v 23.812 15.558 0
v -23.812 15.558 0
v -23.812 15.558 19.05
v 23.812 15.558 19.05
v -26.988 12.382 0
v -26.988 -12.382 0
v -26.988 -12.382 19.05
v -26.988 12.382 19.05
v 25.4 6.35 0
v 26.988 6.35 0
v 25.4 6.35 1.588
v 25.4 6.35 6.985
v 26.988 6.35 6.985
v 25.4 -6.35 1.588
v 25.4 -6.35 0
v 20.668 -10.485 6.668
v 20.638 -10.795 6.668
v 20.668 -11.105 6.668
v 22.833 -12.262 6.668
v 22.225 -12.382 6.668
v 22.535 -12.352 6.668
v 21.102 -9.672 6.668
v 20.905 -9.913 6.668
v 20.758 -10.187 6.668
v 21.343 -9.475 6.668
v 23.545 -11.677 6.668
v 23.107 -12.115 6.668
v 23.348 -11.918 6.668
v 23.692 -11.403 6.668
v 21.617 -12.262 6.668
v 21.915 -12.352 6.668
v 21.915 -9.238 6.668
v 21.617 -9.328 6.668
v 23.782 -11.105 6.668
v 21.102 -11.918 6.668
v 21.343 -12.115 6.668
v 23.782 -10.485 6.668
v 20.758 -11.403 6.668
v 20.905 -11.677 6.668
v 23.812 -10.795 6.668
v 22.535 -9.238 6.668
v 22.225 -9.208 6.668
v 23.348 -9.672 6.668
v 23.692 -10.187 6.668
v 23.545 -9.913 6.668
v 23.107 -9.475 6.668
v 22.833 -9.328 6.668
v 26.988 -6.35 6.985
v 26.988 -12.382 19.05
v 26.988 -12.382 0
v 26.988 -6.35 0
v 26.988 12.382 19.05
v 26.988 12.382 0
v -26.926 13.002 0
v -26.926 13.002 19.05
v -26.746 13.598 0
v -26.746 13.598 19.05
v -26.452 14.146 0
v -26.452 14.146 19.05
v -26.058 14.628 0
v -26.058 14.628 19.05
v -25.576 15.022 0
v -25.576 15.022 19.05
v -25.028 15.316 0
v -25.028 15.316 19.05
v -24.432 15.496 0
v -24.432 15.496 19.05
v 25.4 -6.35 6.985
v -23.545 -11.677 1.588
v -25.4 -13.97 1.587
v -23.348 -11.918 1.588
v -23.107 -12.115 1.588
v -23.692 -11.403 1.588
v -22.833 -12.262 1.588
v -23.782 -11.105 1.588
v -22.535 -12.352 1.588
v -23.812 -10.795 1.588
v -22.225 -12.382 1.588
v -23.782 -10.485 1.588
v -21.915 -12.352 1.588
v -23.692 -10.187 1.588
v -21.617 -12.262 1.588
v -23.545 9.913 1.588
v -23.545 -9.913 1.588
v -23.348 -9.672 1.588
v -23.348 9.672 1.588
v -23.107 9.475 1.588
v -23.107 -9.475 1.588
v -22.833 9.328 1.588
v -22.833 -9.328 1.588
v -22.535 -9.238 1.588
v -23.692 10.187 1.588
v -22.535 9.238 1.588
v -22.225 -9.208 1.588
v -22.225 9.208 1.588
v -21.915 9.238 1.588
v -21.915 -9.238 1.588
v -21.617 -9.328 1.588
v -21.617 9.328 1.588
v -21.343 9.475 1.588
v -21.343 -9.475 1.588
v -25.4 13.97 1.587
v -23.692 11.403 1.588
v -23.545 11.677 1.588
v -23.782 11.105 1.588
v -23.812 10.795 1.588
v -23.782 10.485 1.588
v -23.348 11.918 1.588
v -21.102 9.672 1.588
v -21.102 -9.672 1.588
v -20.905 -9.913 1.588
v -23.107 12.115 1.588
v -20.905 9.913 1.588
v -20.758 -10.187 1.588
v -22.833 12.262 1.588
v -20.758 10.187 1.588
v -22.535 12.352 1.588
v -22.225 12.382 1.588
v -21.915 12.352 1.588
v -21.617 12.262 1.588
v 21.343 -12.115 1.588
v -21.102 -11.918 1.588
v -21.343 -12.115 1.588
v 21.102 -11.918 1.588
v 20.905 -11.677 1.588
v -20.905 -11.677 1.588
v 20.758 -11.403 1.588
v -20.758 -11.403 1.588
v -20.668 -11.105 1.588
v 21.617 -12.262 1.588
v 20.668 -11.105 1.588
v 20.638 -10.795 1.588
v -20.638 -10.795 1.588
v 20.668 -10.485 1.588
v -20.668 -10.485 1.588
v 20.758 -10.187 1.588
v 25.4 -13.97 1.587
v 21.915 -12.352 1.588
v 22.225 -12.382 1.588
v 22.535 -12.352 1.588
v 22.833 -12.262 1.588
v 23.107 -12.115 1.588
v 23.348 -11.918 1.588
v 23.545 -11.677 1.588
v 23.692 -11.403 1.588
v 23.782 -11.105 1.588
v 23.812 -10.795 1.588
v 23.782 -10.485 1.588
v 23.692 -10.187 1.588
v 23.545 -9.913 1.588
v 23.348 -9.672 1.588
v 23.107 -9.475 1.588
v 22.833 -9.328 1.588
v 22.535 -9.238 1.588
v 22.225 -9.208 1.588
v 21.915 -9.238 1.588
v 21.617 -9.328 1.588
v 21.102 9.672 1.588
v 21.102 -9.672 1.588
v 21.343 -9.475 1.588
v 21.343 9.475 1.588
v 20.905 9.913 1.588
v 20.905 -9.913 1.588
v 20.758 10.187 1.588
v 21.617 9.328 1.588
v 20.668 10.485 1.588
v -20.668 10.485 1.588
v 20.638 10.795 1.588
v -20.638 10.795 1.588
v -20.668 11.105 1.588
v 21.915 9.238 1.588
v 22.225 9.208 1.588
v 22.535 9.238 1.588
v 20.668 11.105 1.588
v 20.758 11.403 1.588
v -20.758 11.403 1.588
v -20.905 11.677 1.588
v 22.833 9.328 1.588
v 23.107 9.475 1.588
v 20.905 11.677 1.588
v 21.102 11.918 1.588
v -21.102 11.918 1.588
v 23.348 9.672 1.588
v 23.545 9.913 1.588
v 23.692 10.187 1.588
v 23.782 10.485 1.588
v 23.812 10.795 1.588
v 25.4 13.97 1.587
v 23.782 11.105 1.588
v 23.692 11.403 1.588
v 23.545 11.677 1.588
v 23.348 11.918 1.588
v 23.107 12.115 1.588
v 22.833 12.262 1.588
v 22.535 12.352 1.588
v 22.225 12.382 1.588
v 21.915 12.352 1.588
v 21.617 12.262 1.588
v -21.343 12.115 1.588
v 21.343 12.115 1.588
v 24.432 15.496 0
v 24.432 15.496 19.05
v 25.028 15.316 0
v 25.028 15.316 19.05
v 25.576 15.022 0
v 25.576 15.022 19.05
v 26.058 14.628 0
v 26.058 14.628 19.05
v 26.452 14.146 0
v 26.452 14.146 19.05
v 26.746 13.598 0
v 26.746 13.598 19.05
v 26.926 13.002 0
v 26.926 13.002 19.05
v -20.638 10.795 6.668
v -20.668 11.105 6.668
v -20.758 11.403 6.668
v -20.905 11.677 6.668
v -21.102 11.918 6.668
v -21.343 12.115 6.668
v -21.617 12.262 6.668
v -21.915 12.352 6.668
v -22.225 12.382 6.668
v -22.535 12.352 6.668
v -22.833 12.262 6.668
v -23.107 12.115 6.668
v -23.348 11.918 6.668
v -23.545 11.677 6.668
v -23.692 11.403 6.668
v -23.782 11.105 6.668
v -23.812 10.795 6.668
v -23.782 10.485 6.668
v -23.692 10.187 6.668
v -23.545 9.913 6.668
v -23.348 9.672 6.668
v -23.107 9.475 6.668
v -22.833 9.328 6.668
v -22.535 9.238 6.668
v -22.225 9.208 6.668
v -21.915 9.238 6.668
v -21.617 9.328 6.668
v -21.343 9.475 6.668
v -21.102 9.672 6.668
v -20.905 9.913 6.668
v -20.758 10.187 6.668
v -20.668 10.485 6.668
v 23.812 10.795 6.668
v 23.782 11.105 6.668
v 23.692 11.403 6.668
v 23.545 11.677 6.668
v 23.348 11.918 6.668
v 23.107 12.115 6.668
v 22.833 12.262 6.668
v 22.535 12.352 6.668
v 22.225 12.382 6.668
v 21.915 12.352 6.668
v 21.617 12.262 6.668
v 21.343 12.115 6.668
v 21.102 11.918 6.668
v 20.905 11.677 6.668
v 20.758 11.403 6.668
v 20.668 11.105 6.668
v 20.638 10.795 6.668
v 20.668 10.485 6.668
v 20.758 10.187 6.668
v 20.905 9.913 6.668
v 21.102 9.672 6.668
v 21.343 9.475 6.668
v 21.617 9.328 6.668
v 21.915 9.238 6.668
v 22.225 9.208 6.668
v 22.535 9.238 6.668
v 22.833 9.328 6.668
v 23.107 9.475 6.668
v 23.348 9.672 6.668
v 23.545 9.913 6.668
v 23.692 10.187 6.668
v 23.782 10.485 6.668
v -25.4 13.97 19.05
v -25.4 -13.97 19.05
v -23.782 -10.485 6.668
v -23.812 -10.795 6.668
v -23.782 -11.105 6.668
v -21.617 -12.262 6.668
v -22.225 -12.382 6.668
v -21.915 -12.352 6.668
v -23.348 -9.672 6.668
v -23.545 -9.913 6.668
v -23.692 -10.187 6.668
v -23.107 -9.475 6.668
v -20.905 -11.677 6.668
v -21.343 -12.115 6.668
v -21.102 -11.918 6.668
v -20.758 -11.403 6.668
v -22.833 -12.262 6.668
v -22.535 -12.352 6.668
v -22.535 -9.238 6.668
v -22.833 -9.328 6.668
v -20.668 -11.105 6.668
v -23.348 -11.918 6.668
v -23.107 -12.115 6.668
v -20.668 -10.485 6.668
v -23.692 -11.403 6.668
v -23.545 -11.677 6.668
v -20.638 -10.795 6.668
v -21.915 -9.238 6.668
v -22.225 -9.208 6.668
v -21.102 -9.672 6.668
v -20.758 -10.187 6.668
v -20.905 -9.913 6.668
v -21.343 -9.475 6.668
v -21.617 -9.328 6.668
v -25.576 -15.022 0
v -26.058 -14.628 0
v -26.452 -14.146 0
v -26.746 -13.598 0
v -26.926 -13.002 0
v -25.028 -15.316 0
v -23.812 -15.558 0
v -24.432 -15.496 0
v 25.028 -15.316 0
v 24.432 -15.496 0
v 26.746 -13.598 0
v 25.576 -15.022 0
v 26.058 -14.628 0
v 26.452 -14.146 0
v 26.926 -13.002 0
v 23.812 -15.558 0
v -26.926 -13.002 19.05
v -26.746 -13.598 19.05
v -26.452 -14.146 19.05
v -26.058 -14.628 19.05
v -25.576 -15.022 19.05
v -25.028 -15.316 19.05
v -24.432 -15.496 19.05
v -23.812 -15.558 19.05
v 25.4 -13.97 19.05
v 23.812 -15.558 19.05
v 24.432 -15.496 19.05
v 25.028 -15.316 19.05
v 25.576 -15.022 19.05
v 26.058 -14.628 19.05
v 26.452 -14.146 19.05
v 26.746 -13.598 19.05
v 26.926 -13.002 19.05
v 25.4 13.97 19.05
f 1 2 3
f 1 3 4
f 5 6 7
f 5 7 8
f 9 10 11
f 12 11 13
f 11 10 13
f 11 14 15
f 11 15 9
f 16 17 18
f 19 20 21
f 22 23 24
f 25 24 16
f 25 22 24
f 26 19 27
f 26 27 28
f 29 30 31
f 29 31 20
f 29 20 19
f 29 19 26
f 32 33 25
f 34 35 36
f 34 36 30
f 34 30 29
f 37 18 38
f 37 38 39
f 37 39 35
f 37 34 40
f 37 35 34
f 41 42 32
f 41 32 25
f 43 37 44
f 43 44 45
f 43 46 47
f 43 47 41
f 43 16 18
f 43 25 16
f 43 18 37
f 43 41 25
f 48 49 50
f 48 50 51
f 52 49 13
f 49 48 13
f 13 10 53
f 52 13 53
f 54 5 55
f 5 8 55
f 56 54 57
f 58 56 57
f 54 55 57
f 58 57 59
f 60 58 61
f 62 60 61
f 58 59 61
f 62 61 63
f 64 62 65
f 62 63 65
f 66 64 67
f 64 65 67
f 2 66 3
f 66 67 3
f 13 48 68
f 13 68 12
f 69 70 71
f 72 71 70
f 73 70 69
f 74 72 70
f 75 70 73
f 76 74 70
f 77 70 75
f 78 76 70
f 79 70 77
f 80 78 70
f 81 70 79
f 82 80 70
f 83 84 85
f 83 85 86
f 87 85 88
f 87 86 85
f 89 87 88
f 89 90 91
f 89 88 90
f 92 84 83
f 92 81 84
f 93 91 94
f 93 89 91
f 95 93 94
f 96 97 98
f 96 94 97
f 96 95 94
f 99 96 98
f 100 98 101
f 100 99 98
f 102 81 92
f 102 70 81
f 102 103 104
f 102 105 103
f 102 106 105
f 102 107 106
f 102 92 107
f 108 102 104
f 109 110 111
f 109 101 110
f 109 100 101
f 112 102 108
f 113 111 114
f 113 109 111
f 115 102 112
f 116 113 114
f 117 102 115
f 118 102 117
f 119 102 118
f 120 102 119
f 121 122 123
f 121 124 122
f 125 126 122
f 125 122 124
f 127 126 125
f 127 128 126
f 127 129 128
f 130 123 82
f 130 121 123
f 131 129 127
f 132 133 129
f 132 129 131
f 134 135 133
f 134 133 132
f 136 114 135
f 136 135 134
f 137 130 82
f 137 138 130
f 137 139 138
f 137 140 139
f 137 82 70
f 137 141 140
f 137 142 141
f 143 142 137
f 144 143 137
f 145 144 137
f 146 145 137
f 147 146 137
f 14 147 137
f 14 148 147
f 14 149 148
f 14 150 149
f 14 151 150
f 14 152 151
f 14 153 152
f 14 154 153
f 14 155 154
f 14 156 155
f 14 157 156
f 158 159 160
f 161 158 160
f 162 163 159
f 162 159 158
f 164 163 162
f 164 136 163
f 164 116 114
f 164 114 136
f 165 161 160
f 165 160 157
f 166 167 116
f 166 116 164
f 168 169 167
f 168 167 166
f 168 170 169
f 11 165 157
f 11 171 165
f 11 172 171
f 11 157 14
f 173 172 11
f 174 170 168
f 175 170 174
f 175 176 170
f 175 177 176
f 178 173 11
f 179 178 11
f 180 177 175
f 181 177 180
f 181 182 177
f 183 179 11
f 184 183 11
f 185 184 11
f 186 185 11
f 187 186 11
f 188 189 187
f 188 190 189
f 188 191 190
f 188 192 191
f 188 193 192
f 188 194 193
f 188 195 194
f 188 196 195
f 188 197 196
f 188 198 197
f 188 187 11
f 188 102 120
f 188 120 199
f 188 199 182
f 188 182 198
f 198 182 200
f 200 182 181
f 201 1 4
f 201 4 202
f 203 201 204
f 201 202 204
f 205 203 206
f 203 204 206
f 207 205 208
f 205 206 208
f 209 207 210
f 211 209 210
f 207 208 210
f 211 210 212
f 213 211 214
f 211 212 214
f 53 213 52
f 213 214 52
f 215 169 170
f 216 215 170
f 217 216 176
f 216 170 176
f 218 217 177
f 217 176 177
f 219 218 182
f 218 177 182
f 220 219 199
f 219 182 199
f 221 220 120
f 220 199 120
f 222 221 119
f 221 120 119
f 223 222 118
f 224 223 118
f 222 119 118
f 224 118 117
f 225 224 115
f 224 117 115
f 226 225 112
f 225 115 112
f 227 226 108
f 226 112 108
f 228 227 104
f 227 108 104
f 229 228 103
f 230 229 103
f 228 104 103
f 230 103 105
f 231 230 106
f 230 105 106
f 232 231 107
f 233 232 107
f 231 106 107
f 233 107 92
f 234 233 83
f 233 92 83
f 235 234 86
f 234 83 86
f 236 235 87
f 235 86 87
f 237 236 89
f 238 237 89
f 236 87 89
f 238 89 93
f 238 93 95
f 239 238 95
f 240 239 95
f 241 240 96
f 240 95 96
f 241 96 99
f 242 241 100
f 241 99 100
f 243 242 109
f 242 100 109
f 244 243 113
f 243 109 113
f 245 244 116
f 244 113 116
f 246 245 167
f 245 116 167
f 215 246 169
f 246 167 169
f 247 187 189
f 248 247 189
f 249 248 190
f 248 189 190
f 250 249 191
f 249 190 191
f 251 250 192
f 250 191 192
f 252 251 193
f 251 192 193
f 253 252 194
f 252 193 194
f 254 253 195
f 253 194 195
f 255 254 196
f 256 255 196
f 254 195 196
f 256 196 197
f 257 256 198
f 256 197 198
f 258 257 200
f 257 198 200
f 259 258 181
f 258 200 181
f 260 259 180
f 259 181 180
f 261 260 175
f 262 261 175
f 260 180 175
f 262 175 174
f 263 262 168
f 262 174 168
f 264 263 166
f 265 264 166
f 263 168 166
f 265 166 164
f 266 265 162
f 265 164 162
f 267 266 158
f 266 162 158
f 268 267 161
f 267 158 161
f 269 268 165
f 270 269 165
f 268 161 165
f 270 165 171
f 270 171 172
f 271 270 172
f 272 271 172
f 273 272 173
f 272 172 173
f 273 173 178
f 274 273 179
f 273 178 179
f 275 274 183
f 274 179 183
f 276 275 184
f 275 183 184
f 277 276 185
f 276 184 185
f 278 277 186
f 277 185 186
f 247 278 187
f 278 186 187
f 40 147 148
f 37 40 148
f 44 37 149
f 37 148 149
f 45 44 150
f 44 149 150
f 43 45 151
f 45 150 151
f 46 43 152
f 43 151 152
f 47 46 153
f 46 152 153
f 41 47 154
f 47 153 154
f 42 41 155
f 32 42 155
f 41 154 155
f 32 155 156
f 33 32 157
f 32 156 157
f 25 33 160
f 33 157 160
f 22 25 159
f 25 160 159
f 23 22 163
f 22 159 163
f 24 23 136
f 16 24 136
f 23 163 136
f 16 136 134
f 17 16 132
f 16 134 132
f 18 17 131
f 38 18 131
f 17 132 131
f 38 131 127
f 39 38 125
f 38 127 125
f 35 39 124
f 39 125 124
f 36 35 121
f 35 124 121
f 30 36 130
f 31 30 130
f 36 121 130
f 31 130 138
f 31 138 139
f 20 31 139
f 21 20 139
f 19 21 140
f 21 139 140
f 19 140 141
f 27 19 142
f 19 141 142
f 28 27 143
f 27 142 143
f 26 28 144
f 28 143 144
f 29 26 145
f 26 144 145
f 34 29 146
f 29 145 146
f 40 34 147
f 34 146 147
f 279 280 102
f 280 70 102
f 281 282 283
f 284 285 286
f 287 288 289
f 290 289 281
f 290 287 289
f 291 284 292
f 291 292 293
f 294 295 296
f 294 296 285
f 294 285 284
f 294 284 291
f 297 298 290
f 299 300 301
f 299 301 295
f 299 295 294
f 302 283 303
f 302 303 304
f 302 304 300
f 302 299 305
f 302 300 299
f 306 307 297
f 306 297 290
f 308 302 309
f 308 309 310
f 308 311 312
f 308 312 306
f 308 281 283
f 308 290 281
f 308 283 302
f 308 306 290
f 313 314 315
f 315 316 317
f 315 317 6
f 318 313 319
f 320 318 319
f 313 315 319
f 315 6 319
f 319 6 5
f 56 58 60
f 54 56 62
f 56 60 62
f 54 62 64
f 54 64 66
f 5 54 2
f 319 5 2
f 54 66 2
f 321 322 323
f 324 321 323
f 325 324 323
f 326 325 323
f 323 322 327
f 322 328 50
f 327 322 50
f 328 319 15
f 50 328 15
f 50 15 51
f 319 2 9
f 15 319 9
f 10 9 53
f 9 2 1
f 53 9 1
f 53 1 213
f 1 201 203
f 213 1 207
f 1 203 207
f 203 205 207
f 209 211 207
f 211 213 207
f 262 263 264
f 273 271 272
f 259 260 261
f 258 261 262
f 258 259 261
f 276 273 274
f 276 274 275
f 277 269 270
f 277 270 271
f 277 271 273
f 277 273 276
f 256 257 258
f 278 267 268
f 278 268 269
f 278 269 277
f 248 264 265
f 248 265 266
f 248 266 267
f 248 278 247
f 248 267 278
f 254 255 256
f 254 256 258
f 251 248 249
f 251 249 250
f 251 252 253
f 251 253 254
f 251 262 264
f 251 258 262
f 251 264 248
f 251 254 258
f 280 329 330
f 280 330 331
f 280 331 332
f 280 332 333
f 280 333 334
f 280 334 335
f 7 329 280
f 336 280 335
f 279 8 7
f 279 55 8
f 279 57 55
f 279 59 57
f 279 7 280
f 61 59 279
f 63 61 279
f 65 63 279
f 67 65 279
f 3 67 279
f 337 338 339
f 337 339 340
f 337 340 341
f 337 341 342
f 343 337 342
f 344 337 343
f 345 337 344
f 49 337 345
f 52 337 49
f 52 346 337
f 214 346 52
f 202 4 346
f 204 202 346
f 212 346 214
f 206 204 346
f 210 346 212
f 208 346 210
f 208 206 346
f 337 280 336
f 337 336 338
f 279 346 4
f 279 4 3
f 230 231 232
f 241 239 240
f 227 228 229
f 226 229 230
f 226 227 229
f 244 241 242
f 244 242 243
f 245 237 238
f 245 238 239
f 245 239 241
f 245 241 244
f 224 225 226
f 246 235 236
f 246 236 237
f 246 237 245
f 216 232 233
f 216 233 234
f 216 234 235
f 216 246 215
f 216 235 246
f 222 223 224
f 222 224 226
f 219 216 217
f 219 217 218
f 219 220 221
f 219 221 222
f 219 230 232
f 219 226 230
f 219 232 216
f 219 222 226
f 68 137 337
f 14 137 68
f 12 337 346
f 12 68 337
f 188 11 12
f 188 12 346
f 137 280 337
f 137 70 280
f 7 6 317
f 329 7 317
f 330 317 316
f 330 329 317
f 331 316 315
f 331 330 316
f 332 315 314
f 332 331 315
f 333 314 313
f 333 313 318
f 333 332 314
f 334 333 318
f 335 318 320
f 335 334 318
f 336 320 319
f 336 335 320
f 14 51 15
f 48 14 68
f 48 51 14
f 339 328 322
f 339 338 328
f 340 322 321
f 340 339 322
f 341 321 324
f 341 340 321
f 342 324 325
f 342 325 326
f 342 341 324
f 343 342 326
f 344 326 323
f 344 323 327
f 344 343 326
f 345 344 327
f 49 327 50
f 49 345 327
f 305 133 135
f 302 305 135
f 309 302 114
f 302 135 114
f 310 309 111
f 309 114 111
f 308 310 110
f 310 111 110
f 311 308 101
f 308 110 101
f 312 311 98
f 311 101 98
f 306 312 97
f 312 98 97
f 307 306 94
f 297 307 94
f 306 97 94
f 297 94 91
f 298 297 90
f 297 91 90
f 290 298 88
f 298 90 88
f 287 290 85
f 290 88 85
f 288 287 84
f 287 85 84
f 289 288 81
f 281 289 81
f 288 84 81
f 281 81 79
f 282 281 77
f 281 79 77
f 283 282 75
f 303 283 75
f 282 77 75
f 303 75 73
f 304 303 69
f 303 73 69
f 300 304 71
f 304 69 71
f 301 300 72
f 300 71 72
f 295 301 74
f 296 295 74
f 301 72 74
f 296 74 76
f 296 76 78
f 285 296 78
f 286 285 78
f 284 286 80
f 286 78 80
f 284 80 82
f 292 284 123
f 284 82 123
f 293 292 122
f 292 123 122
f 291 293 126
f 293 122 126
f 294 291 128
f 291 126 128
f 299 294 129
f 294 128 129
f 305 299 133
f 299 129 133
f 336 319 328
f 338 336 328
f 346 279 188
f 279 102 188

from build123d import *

# Parameters (mm, degrees)
F0_W     = 53.975
F0_H     = 31.115
F1_DEPTH = 19.05
F2_T     = -1.5875
F3_R     = 1.5875
F4_DEPTH = 5.08
F5_W     = 12.7
F5_H     = 7.62
F6_DEPTH = 1.5875
F7_R     = 3.175


with BuildPart() as f1:
    # F0 (on Top) → F1 (new body)
    with BuildSketch(Plane.XY):
        Rectangle(F0_W, F0_H)
    extrude(amount=F1_DEPTH)

    # F2
    f2_openings = [f1.faces().sort_by_distance(p)[0] for p in [
        (0, 0, 19.05),
    ]]
    offset(amount=F2_T, openings=f2_openings)

    # F3 (on face) → F4 (join)
    with BuildSketch(Plane.XY.offset(1.5875)):
        with Locations((22.225, 10.795)):
            Circle(F3_R)
        with Locations((22.225, -10.795)):
            Circle(F3_R)
        with Locations((-22.225, 10.795)):
            Circle(F3_R)
        with Locations((-22.225, -10.795)):
            Circle(F3_R)
    extrude(amount=F4_DEPTH)

    # F5 (on face) → F6 (cut)
    with BuildSketch(Plane.YZ.offset(26.9875)):
        with Locations((0, 3.175)):
            Rectangle(F5_W, F5_H)
    extrude(amount=-F6_DEPTH, mode=Mode.SUBTRACT)

    # F7
    f7_edges = [f1.edges().sort_by_distance(p)[0] for p in [
        (26.9875, -15.5575, 9.525),
        (-26.9875, -15.5575, 9.525),
        (-26.9875, 15.5575, 9.525),
        (26.9875, 15.5575, 9.525),
    ]]
    fillet(f7_edges, radius=F7_R)


solid = f1.part
